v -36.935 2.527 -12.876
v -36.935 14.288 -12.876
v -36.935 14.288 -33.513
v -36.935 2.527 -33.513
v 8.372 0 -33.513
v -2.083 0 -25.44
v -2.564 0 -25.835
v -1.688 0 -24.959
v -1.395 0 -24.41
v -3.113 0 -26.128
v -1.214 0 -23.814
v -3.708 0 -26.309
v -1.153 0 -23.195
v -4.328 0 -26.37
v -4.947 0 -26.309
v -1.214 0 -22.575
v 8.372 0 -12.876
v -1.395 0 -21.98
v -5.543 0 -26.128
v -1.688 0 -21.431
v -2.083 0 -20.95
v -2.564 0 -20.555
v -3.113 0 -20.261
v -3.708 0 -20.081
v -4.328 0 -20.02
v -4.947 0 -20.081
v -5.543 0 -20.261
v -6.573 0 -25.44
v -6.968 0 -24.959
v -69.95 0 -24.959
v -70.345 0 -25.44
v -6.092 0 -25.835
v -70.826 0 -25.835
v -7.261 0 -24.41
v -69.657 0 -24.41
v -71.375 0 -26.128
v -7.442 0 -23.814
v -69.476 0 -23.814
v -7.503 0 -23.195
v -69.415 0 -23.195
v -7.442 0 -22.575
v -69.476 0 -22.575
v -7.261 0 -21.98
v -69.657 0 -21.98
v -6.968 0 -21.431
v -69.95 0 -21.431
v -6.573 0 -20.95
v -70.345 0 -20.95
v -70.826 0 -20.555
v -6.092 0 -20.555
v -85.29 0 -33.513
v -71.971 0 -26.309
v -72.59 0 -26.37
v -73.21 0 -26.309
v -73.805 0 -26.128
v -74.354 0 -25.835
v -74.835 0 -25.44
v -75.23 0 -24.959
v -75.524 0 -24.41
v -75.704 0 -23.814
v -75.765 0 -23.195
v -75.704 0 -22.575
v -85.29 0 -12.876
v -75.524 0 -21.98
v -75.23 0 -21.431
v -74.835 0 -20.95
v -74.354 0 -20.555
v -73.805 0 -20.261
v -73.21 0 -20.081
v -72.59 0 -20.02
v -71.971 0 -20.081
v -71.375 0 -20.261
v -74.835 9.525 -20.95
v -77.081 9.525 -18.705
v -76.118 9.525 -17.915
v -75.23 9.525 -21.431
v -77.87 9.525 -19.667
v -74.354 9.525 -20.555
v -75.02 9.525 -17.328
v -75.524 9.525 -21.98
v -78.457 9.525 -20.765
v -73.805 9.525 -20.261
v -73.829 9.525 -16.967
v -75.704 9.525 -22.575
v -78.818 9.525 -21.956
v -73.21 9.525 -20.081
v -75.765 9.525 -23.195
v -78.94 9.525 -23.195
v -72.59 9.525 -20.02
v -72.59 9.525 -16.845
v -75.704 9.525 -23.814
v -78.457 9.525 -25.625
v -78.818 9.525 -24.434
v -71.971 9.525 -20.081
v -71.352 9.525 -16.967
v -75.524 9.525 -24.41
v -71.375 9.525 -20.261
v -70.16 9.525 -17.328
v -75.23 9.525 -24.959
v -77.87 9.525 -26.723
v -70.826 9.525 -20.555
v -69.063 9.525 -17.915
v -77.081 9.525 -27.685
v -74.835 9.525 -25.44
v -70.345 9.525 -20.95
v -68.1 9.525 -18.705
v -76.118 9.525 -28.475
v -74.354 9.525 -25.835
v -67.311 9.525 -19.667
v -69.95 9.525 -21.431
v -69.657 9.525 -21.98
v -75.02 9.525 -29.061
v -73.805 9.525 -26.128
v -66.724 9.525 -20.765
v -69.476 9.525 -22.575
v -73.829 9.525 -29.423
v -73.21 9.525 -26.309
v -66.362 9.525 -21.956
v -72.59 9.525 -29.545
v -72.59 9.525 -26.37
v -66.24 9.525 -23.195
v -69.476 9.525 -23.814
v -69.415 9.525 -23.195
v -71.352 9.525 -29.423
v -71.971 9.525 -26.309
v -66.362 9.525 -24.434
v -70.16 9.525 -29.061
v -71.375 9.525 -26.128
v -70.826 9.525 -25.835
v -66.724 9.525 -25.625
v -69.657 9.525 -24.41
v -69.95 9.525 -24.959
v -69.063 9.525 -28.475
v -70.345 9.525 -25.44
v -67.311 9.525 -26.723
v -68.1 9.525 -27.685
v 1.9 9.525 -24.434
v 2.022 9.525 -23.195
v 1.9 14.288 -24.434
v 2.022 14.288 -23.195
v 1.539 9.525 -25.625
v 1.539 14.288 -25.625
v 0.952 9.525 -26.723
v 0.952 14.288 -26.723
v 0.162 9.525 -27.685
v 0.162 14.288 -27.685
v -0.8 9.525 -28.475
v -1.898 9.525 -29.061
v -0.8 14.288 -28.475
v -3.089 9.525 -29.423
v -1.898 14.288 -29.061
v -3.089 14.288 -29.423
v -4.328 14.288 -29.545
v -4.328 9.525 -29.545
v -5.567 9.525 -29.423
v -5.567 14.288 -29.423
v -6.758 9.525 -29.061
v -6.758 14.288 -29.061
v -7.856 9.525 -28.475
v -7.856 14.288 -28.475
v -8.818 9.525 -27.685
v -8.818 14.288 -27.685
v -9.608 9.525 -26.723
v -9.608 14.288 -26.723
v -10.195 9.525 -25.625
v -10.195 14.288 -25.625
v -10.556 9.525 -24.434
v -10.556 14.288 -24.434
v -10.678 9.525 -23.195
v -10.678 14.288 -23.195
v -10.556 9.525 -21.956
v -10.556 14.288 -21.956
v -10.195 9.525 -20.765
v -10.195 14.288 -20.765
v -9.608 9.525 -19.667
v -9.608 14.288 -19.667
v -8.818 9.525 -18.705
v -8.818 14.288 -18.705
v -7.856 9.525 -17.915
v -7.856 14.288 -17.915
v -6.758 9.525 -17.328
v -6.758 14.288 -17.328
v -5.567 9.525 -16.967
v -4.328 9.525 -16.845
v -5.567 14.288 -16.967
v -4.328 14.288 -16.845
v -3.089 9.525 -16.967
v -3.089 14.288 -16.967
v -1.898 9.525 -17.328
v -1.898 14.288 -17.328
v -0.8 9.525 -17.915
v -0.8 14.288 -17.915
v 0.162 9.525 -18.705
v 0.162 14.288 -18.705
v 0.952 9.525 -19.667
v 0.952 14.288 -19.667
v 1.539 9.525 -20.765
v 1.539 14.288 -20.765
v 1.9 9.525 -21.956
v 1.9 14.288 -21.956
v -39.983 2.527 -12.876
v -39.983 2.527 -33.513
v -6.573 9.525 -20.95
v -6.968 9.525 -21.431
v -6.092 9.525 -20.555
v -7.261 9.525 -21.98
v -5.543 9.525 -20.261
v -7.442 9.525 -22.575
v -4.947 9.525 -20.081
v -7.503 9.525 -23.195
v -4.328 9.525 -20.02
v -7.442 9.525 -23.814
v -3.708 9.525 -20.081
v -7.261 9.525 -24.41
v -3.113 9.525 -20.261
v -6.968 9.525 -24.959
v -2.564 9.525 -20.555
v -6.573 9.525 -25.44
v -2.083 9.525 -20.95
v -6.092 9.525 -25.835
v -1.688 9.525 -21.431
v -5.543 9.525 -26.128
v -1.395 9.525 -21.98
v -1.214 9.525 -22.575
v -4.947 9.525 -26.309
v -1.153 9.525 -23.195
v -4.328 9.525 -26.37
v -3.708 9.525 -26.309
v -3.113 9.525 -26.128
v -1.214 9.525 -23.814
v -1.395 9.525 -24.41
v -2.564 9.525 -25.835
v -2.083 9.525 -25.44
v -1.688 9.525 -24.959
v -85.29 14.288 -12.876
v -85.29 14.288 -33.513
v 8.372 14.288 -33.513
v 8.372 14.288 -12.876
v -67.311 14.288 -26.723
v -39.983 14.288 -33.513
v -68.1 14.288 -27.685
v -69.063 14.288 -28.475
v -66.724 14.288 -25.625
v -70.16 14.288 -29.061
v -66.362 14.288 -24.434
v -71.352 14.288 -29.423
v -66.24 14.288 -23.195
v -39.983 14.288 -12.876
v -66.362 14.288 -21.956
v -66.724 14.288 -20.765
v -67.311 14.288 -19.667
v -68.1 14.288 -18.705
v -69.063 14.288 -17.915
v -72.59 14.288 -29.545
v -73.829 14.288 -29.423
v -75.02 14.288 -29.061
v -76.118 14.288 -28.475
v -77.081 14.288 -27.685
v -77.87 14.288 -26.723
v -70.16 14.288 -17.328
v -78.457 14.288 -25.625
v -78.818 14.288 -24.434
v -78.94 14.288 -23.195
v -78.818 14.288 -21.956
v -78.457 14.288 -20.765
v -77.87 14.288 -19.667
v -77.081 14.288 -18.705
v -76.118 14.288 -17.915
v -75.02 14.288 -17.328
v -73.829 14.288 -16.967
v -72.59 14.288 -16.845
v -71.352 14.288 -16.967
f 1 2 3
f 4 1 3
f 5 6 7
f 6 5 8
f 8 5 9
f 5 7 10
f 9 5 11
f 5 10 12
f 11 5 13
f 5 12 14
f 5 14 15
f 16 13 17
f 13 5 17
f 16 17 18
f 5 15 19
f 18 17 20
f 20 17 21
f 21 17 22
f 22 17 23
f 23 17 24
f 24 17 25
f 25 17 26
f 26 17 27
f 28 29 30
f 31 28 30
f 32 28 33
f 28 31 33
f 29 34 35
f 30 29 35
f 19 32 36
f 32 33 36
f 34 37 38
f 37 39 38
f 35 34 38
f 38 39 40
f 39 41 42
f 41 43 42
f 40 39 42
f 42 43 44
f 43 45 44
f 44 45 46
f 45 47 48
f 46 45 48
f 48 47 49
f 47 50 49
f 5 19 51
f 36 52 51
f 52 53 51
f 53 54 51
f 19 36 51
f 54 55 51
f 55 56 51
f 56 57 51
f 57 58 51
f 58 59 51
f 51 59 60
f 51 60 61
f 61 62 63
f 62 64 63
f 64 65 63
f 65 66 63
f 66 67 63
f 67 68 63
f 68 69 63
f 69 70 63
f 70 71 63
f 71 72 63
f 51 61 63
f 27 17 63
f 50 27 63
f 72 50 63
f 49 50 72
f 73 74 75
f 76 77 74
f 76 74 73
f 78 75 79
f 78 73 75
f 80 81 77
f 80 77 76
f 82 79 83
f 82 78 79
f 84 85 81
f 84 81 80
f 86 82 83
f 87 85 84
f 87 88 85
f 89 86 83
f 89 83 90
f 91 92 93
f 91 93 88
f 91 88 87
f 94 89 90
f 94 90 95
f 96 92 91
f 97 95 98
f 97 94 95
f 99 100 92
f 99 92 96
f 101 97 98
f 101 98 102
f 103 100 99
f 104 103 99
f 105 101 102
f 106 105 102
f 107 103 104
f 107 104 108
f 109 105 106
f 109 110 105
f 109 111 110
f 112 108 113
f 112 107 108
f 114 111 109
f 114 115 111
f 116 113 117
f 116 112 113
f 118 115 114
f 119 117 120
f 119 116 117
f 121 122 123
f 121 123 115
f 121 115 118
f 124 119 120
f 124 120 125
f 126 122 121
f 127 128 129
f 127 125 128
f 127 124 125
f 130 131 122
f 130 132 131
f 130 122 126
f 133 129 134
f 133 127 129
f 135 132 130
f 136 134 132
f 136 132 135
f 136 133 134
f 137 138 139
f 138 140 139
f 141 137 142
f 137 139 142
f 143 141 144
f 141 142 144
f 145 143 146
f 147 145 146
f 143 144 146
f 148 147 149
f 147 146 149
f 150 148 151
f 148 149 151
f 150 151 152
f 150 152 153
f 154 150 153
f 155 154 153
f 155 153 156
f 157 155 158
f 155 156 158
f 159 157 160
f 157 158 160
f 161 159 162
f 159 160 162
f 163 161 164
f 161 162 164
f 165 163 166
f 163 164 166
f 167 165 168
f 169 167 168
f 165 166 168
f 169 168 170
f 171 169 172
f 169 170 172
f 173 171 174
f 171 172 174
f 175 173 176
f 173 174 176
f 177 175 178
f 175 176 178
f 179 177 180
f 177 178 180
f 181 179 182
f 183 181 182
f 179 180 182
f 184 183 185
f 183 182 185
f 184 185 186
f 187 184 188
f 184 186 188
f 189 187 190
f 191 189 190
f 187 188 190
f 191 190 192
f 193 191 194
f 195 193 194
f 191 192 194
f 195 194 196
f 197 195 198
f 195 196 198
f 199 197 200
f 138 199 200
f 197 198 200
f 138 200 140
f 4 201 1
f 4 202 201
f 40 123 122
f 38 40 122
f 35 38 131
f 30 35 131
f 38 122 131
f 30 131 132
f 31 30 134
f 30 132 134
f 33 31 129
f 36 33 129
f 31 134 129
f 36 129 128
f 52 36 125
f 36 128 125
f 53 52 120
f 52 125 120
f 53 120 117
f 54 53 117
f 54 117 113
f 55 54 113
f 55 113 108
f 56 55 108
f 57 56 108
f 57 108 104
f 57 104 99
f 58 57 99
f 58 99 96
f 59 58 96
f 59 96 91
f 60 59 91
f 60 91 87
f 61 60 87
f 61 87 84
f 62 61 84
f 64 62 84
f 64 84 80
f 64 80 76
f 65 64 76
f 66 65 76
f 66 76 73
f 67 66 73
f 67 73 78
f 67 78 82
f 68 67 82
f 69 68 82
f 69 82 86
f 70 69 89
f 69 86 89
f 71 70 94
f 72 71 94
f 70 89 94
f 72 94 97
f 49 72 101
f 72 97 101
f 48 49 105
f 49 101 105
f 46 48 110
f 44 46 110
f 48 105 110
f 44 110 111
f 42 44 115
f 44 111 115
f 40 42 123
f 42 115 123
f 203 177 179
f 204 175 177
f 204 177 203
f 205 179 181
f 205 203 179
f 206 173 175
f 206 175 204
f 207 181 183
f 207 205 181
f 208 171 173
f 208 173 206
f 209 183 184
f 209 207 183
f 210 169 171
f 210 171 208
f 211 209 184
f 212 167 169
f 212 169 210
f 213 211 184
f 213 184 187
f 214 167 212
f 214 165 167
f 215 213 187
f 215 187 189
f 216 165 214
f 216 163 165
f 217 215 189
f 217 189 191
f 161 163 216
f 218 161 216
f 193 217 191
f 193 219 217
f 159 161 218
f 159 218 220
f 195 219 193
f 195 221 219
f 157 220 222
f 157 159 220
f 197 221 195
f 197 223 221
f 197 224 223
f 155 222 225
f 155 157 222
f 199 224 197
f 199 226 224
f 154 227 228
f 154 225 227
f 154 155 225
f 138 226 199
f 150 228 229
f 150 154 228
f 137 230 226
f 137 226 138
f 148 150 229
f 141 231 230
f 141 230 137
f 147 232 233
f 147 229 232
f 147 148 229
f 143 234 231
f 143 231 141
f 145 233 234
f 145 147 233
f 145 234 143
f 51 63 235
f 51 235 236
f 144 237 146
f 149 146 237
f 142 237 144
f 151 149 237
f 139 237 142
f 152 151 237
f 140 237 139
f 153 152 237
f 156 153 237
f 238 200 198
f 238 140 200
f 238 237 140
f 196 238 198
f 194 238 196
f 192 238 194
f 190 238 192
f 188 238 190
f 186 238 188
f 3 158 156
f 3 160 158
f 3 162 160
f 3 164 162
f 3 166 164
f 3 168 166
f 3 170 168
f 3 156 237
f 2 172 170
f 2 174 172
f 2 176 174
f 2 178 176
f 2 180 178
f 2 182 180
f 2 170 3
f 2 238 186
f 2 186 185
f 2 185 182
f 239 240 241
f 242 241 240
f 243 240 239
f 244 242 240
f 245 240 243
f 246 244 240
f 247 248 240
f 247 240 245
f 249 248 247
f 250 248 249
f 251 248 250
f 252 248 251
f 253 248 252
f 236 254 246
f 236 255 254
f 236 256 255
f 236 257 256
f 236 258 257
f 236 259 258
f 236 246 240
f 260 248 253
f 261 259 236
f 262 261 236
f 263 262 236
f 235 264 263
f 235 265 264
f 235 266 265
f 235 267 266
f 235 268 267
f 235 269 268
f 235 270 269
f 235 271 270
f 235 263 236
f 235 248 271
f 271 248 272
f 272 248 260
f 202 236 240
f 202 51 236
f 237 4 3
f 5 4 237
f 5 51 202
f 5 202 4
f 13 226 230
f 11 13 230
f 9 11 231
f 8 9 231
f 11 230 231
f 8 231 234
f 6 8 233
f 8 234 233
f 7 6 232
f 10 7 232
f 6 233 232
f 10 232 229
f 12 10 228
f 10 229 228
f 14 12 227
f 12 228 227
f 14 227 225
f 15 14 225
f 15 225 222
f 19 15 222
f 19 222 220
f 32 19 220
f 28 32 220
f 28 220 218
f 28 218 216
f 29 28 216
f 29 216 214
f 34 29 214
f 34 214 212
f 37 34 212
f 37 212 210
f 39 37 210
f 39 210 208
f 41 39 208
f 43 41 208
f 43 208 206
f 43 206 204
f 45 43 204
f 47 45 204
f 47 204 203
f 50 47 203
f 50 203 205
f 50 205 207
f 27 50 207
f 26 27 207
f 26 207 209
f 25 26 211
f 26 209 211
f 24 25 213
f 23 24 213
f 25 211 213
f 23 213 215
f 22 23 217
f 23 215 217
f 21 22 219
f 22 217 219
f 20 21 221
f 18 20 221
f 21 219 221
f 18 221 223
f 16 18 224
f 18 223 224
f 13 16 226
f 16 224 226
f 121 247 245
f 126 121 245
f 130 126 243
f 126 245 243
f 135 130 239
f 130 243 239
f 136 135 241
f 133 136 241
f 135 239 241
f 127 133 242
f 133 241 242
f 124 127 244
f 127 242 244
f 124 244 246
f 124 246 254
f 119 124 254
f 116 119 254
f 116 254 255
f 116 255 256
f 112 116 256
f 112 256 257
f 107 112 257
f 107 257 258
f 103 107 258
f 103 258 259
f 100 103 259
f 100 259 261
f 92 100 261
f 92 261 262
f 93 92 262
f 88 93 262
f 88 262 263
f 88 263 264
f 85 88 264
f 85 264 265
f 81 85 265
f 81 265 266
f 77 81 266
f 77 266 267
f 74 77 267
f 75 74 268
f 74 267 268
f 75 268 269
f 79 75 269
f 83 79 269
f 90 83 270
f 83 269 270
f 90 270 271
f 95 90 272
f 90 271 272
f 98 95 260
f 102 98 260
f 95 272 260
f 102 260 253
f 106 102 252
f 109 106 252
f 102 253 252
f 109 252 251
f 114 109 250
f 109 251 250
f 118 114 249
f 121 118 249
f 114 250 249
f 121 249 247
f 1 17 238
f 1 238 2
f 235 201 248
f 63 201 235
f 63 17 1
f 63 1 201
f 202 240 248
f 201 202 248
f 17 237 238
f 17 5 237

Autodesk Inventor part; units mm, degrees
ref_plane "YZ Plane" through (0, 0, 0) normal (1, 0, 0) x (0, 1, 0)
ref_plane "XZ Plane" through (0, 0, 0) normal (0, 1, 0) x (-1, 0, 0)
ref_plane "XY Plane" through (0, 0, 0) normal (0, 0, 1) x (1, 0, 0)
sketch "Sketch1" plane through (0, 0, 0) normal (0, 1, 0) x (-1, 0, 0)
  line L0 (85.2904, -33.5134) -> (-8.3721, -33.5134)
  line L1 (-8.3721, -33.5134) -> (-8.3721, -12.8759)
  line L2 (-8.3721, -12.8759) -> (85.2904, -12.8759)
  line L3 (85.2904, -12.8759) -> (85.2904, -33.5134)
  point P0 (0, 0)
  dimension "d0" = 93.6625
  dimension "d1" = 20.6375
extrude "Extrusion1" add sketch "Sketch1" along normal blind 14.2875
sketch "Sketch2" plane through (0, 14.2875, 0) normal (0, 1, 0) x (1, 0, 0)
  line L0 (8.3721, 33.5134) -> (-85.2904, 33.5134) projected
  line L1 (-85.2904, 33.5134) -> (-85.2904, 12.8759) projected
  line L2 (-85.2904, 12.8759) -> (8.3721, 12.8759) projected
  line L3 (8.3721, 12.8759) -> (8.3721, 33.5134) projected
  line L4 (-85.2904, 23.1947) -> (8.3721, 23.1947) construction
  line L5 (-4.3279, 33.5134) -> (-4.3279, 12.8759) construction
  line L6 (-72.5904, 33.5134) -> (-72.5904, 12.8759) construction
  circle A0 centre (-72.5904, 23.1947) radius 3.175
  circle A1 centre (-4.3279, 23.1947) radius 3.175
  point P0 (0, 0)
  dimension "d4" = 12.7
  dimension "d5" = 12.7
  dimension "d6" = 6.35
  dimension "d7" = 6.35
extrude "Extrusion2" cut sketch "Sketch2" against normal blind 14.2875 contours A0 | A1
sketch "Sketch3" plane through (0, 14.2875, 0) normal (0, 1, 0) x (1, 0, 0)
  circle A0 centre (-72.5904, 23.1947) radius 3.175 projected
  circle A1 centre (-4.3279, 23.1947) radius 3.175 projected
  circle A2 centre (-72.5904, 23.1947) radius 6.35
  circle A3 centre (-4.3279, 23.1947) radius 6.35
  point P0 (0, 0)
  point P1 (8.3721, 33.5134)
  point P2 (-85.2904, 33.5134)
  dimension "d10" = 12.7
  dimension "d11" = 12.7
  dimension "d14" = 68.2625
  dimension "d16" = 93.6625
extrude "Extrusion3" cut sketch "Sketch3" against normal blind 4.7625
sketch "Sketch4" plane through (0, 14.2875, 0) normal (0, 1, 0) x (1, 0, 0)
  line L0 (8.3721, 33.5134) -> (-85.2904, 33.5134) projected
  line L1 (-85.2904, 12.8759) -> (8.3721, 12.8759) projected
  line L2 (-38.4591, 33.5134) -> (-38.4591, 12.8759) construction
  line L3 (-38.4591, 23.1947) -> (-36.9351, 23.1947) construction
  line L4 (-36.9351, 23.1947) -> (-39.9831, 23.1947) construction
  line L5 (-39.9831, 33.5134) -> (-39.9831, 12.8759)
  line L6 (-39.9831, 12.8759) -> (-36.9351, 12.8759)
  line L7 (-36.9351, 12.8759) -> (-36.9351, 33.5134)
  line L8 (-39.9831, 33.5134) -> (-36.9351, 33.5134)
  point P0 (0, 0)
  dimension "d19" = 1.524
  dimension "d21" = 3.048
extrude "Extrusion4" cut sketch "Sketch4" against normal blind 11.7602
equation "\"d5\" = d4"
equation "\"d6\" = d7"
equation "\"d10\" = d11"
properties part number "Battery Base"
